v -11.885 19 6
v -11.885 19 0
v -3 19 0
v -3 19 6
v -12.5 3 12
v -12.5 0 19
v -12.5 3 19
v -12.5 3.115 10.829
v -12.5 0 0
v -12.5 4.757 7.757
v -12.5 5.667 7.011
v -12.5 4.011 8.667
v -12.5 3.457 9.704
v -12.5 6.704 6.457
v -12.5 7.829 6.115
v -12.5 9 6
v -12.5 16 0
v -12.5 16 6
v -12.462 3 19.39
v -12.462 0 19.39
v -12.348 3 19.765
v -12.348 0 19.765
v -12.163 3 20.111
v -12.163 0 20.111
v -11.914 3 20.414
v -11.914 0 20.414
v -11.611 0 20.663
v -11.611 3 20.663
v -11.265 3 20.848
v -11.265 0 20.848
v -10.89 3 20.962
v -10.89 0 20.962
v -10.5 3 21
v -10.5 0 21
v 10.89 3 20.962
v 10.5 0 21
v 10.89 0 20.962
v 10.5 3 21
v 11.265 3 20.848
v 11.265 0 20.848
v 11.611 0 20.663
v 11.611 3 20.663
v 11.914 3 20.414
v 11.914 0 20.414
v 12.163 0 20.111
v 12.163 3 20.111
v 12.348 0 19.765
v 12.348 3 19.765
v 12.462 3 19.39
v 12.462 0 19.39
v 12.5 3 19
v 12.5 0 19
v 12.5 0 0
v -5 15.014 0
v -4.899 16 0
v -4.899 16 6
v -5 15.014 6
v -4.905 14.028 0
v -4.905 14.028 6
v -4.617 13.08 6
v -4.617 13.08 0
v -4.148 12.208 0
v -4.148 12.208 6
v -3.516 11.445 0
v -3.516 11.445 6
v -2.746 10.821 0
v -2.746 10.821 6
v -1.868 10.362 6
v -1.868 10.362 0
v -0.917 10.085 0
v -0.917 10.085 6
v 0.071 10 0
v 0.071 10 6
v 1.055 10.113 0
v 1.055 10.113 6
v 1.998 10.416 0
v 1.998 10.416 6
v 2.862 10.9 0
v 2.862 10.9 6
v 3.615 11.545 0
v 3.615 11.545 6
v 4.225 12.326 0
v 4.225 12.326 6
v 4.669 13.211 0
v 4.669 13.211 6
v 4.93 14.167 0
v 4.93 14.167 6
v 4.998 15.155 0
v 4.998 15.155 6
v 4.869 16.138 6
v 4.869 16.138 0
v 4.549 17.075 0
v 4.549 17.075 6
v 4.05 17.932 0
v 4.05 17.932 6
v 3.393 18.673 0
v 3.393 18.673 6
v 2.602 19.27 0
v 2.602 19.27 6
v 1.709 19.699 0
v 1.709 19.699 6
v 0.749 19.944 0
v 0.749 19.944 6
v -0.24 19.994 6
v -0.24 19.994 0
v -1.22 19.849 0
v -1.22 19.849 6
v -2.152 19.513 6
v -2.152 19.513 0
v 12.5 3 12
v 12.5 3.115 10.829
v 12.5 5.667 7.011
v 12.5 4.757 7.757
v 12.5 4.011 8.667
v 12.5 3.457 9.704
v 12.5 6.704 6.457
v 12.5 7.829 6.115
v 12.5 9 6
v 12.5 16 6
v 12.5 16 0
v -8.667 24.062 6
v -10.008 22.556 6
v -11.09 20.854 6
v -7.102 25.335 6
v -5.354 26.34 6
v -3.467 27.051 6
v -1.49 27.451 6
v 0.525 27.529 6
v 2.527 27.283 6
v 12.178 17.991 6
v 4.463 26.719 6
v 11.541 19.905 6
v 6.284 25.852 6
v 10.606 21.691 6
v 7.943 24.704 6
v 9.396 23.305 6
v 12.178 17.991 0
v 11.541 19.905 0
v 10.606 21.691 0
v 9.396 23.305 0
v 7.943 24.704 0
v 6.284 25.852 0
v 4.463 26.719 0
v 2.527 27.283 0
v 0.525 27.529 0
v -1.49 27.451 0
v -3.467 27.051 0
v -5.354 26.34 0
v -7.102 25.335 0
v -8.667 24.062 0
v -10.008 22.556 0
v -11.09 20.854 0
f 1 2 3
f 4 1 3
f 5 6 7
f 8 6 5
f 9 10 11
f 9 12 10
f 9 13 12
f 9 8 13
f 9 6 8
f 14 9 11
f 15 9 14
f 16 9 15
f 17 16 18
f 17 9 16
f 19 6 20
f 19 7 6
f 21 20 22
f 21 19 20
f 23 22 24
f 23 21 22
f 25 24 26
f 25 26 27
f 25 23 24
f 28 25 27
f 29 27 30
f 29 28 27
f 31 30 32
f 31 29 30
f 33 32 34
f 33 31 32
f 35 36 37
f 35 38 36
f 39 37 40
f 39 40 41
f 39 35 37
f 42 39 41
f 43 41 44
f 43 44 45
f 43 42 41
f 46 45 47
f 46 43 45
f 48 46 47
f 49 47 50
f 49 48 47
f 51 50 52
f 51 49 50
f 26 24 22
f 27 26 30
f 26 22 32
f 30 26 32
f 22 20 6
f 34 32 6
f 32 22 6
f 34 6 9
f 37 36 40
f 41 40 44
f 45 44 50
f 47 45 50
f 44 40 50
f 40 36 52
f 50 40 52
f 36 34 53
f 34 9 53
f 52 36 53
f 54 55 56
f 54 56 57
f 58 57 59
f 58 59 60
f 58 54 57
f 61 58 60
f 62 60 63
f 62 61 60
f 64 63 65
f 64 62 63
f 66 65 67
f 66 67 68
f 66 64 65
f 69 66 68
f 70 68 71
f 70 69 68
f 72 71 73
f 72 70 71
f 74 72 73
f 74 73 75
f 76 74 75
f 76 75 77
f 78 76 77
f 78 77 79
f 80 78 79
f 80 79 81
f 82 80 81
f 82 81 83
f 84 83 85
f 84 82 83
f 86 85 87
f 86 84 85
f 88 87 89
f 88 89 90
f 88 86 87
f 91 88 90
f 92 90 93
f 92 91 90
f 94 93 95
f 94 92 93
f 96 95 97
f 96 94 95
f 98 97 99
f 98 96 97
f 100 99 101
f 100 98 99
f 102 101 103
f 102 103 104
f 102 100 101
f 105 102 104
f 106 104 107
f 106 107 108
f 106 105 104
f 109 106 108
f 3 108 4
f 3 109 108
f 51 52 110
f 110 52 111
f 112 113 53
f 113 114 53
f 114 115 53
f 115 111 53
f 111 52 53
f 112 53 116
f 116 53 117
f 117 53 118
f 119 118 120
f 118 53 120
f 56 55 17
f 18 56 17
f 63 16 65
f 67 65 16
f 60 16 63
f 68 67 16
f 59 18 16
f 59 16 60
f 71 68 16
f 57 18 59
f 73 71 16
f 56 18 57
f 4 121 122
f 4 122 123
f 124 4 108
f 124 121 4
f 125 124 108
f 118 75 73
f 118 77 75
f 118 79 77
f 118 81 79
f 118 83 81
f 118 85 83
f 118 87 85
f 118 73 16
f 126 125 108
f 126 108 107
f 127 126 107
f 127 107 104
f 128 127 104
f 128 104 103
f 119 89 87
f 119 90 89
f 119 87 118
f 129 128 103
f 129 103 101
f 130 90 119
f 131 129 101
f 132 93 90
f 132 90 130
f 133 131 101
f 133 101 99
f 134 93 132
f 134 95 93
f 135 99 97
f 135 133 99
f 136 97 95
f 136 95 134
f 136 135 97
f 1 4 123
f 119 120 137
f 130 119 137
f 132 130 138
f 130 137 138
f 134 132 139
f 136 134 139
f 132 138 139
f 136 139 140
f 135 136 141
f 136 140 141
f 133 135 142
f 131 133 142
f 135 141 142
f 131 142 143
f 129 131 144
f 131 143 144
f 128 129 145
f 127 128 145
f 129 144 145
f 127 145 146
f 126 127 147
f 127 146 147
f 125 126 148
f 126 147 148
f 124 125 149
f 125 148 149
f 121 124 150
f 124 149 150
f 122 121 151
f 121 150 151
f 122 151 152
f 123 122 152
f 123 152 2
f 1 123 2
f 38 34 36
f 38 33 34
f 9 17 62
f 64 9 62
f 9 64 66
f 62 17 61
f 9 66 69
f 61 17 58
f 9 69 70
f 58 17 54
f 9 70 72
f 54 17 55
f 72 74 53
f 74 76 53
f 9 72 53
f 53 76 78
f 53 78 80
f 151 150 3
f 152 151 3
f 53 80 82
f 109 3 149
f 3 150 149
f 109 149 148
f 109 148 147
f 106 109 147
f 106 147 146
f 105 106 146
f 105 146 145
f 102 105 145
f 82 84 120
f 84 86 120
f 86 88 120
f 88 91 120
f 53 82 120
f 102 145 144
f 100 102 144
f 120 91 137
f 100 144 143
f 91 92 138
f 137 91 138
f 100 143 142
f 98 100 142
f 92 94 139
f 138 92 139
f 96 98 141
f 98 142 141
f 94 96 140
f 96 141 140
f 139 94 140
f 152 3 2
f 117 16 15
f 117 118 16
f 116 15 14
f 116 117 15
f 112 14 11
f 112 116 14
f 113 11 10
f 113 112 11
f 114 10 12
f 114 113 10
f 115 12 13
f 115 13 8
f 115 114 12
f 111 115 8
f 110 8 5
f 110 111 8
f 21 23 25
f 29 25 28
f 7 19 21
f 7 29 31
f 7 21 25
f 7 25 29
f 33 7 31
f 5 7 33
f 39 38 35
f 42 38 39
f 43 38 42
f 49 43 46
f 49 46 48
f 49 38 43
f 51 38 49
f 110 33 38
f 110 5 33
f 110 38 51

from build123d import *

# Parameters (mm, degrees)
PAD_DEPTH    = 6
SKETCH001_W  = 25
SKETCH001_H  = 3
PAD001_DEPTH = 15
FILLET_R     = 6
FILLET001_R  = 2


with BuildPart() as part:
    # Sketch → Pad (new body)
    with BuildSketch(Plane.XY):
        with BuildLine():
            Line((-12.5, 0), (12.5, 0))
            Line((12.5, 0), (12.5, 16))
            ThreePointArc((12.5, 16), (1.531208, 27.4461), (-11.884864, 19))
            Line((-11.884864, 19), (-3, 19))
            ThreePointArc((-4.898979, 16), (4.224745, 12.325765), (-3, 19))
            Line((-4.898979, 16), (-12.5, 16))
            Line((-12.5, 16), (-12.5, 0))
        make_face()
    extrude(amount=PAD_DEPTH)

    # Sketch001 → Pad001 (new body)
    with BuildSketch(Plane.XY.offset(6)):
        with Locations((0, 1.5)):
            Rectangle(SKETCH001_W, SKETCH001_H)
    extrude(amount=PAD001_DEPTH)

    # Fillet
    fillet_edges = [part.edges().sort_by_distance(p)[0] for p in [
        (0, 3, 6),
    ]]
    fillet(fillet_edges, radius=FILLET_R)

    # Fillet001
    fillet001_edges = [part.edges().sort_by_distance(p)[0] for p in [
        (-12.5, 1.5, 21),
        (12.5, 1.5, 21),
    ]]
    fillet(fillet001_edges, radius=FILLET001_R)


solid = part.part
